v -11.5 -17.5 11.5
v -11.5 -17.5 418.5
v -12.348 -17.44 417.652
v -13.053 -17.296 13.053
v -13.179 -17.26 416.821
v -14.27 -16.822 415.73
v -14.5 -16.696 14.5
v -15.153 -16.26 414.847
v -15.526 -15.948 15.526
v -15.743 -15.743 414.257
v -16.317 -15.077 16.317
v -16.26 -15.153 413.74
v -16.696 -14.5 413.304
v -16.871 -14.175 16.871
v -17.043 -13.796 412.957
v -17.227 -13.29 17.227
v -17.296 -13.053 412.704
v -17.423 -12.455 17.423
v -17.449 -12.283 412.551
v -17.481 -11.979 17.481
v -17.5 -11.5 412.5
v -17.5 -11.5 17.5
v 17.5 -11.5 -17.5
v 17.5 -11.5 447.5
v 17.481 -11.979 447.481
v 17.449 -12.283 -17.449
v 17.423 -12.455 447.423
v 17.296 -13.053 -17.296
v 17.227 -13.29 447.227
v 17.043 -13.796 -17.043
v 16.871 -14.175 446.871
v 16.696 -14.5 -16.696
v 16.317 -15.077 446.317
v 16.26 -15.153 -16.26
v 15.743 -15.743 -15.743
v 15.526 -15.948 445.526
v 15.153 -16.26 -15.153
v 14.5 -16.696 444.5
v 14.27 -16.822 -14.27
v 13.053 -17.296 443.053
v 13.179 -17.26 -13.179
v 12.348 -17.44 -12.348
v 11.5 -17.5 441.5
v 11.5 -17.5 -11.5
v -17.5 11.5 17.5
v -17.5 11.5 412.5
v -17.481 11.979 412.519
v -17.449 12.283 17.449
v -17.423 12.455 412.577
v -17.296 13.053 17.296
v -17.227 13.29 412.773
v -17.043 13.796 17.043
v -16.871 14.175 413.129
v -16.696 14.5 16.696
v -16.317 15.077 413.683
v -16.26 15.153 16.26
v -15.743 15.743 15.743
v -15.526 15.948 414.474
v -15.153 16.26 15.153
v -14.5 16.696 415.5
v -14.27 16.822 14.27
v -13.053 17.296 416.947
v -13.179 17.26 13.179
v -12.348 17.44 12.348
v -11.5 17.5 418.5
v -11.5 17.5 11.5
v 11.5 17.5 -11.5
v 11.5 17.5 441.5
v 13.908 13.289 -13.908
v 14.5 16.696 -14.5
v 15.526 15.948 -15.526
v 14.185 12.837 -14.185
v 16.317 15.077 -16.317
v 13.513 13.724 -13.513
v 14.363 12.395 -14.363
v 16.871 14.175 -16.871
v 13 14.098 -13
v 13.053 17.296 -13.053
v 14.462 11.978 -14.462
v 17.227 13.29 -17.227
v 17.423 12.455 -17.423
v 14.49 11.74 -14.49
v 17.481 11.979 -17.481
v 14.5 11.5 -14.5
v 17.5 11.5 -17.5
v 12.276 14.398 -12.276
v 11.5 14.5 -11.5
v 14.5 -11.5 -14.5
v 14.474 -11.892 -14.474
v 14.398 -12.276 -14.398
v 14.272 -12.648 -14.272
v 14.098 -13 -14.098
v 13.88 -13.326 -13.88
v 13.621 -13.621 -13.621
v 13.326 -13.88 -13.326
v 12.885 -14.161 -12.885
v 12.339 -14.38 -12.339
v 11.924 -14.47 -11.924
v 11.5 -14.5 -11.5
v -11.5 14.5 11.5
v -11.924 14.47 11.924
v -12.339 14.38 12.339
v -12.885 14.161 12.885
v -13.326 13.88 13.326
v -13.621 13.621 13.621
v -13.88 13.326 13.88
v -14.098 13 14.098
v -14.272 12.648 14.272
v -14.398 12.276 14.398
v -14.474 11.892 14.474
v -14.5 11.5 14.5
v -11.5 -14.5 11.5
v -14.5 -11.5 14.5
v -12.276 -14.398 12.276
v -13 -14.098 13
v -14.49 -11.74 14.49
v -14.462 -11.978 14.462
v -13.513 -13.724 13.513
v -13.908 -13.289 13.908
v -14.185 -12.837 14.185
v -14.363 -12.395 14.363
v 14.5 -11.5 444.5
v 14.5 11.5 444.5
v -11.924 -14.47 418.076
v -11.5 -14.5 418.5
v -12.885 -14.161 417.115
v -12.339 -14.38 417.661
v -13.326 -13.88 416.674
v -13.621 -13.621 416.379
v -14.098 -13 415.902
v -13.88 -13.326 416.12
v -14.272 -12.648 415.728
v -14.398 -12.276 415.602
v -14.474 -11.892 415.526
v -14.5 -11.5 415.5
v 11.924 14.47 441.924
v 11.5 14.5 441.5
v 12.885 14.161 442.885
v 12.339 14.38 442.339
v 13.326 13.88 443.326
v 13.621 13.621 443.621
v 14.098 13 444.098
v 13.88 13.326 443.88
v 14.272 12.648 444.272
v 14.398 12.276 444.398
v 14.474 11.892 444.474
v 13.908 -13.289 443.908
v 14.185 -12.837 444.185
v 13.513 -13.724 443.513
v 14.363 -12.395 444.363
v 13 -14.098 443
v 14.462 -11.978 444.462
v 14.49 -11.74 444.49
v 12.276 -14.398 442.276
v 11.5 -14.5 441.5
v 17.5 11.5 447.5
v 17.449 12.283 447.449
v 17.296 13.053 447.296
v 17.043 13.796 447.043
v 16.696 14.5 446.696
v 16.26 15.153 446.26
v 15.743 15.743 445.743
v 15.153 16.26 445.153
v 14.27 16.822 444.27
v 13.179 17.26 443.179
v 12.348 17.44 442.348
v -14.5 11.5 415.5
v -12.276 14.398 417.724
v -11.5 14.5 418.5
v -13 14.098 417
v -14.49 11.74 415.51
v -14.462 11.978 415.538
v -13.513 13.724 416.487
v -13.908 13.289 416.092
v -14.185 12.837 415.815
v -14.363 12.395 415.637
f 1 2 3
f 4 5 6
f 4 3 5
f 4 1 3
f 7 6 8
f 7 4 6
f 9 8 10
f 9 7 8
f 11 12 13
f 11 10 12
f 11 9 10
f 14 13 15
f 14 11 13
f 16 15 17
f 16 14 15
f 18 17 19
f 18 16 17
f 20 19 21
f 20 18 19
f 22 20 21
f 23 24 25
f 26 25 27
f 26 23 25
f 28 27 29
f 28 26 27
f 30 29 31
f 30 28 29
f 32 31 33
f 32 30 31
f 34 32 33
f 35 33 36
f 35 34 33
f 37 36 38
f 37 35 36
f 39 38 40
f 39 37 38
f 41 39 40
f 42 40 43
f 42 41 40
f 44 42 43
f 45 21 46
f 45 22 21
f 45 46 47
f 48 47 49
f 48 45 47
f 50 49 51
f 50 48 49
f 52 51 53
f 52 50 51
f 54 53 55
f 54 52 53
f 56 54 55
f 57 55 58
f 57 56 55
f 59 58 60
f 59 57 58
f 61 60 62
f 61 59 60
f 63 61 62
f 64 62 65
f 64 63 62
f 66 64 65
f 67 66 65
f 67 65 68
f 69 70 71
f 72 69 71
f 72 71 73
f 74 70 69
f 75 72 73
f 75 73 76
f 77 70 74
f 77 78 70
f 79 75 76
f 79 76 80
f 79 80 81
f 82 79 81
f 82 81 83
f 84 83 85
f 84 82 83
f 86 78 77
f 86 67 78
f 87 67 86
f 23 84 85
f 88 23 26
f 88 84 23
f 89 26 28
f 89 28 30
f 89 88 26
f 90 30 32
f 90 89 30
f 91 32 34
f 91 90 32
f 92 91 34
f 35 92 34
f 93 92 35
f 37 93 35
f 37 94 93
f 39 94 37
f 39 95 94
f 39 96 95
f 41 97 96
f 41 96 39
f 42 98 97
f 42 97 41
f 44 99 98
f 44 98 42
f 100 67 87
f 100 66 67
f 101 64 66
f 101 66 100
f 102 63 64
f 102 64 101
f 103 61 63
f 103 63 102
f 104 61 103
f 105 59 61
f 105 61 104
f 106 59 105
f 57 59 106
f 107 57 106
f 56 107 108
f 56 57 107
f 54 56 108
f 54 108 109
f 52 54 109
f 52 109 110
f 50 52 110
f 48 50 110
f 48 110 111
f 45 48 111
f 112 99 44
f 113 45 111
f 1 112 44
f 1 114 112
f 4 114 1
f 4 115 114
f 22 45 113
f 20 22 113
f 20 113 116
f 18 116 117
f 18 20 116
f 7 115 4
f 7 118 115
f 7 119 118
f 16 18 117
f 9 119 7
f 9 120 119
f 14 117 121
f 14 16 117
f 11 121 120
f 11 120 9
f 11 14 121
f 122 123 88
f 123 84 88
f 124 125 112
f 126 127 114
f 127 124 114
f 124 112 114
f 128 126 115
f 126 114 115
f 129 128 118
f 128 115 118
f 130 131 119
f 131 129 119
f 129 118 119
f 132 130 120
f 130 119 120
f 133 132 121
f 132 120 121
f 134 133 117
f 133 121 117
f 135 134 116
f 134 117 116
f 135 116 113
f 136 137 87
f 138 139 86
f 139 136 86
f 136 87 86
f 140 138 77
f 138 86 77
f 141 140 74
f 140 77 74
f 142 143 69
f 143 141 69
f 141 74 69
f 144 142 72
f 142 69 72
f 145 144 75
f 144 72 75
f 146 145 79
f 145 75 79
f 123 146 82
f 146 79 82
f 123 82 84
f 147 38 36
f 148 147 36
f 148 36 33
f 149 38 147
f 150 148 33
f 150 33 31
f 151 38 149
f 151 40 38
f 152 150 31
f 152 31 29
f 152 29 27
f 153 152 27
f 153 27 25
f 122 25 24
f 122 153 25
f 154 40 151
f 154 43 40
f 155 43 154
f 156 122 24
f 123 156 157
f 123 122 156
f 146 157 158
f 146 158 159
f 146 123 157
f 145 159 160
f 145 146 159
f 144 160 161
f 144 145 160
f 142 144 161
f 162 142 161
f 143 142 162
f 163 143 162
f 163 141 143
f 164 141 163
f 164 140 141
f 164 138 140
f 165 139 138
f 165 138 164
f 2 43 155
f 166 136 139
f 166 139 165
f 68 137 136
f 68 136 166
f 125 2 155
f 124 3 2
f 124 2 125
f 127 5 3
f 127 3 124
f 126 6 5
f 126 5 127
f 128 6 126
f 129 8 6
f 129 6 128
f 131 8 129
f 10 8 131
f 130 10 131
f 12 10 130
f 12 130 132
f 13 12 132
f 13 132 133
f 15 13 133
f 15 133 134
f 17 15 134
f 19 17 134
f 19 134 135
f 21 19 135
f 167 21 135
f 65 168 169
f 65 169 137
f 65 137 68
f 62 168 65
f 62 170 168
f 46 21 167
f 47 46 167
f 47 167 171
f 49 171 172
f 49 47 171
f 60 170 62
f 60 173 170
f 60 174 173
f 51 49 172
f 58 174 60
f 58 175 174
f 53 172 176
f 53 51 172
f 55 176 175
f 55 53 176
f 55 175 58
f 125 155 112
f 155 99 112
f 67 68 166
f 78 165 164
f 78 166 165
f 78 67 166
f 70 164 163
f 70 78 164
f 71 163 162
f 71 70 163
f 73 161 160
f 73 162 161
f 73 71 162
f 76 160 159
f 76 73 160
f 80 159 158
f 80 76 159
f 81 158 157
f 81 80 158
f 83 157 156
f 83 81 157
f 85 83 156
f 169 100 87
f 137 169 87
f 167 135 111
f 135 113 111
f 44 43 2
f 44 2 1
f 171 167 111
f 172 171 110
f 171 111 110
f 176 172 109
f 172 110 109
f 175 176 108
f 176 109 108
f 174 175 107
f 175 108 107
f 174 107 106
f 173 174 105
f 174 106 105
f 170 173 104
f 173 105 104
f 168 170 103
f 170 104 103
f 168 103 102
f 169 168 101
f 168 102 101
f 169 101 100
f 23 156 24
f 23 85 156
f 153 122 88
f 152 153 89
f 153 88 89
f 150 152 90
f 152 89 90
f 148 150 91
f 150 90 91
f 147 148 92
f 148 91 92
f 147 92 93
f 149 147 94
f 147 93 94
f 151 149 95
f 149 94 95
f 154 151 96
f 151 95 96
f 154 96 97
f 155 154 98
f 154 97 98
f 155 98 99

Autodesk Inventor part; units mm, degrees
ref_plane "Start plane" through (0, 0, -17.5) normal (0, 0, 1) x (1, 0, 0)
ref_plane "End plane" through (0, 0, 447.5) normal (0, 0, 1) x (1, 0, 0)
sketch "Sketch" plane through (0, 0, 0) normal (0, 0, 1) x (1, 0, 0)
  line L0 (-17.5, -11.5) -> (-17.5, 11.5)
  line L1 (-11.5, 17.5) -> (11.5, 17.5)
  line L2 (17.5, 11.5) -> (17.5, -11.5)
  line L3 (11.5, -17.5) -> (-11.5, -17.5)
  arc A0 (-17.5, -11.5) -> (-11.5, -17.5) centre (-11.5, -11.5) ccw
  arc A1 (-11.5, 17.5) -> (-17.5, 11.5) centre (-11.5, 11.5) ccw
  arc A2 (17.5, 11.5) -> (11.5, 17.5) centre (11.5, 11.5) ccw
  arc A3 (11.5, -17.5) -> (17.5, -11.5) centre (11.5, -11.5) ccw
  arc A4 (-11.5, 14.5) -> (-14.5, 11.5) centre (-11.5, 11.5) ccw
  line L4 (-11.5, 14.5) -> (11.5, 14.5)
  arc A5 (14.5, 11.5) -> (11.5, 14.5) centre (11.5, 11.5) ccw
  line L5 (14.5, 11.5) -> (14.5, -11.5)
  arc A6 (11.5, -14.5) -> (14.5, -11.5) centre (11.5, -11.5) ccw
  line L6 (11.5, -14.5) -> (-11.5, -14.5)
  arc A7 (-14.5, -11.5) -> (-11.5, -14.5) centre (-11.5, -11.5) ccw
  line L7 (-14.5, -11.5) -> (-14.5, 11.5)
  line L8 (0, 25.4278) -> (0, -25.4278) construction
  line L9 (-25.4278, 0) -> (25.4278, 0) construction
  dimension "d7" = 6
  dimension "d10" = 35
  dimension "d11" = 35
  dimension "d12" = 3
  dimension "d15" = 17.5
  dimension "d16" = 17.5
extrude "Body" add sketch "Sketch" along normal up to surface (465 mm away) from surface at -17.5
sketch "Sketch3" plane through (0, 0, 0) normal (0, 0, 1) x (1, 0, 0)
  line L0 (0, 0) -> (10, 0)
ref_plane "Work Plane3" through (0, 0, 0) normal (0, -1, 0) x (1, 0, 0)
sketch "Sketch4" plane through (0, 0, 0) normal (0, -1, 0) x (1, 0, 0)
  line L0 (-2, -17.5) -> (12, -17.5)
  line L1 (-2, 447.5) -> (12, 447.5)
  dimension "d18" = 465
ref_plane "Work Plane5" through (17.5, 0, 447.5) normal (-0.7071, 0, 0.7071) x (0.7071, 0, 0.7071)
split "Split2" plane through (17.5, 0, 447.5) removes the side toward (-0.7071, 0, 0.7071)
ref_plane "Work Plane12" through (0, 180, -17.5) normal (0, 0, -1) x (-1, 0, 0)
split "Split6" plane through (0, 180, -17.5) removes the side toward (0, 0, -1)
ref_plane "Work Plane13" through (17.5, 0, -17.5) normal (-0.7071, 0, -0.7071) x (-0.7071, 0, 0.7071)
split "Split7" plane through (17.5, 0, -17.5) removes the side toward (-0.7071, 0, -0.7071)
equation "\"d7\" = G_IR"
equation "\"d10\" = G_H"
equation "\"d11\" = G_W"
equation "\"d12\" = G_T"
equation "\"d15\" = 0.5 * d10"
equation "\"d16\" = 0.5 * d11"
equation "\"d3\" = G_L"
equation "\"G_W\" = 35"
equation "\"G_H\" = 35"
equation "\"G_T\" = 3"
equation "\"G_IR\" = 6"
equation "\"G_L\" = d18"
equation "\"G_OFFSET_START\" = 17.5"
equation "\"G_OFFSET_END\" = 17.5"
equation "\"d13\" = -G_OFFSET_START"
equation "\"d14\" = G_OFFSET_END + B_L"
equation "\"B_L\" = 430"
properties part number "AS 1163 - C350L0 35x35x3.0 SHS - 465" material "Steel, Mild"
